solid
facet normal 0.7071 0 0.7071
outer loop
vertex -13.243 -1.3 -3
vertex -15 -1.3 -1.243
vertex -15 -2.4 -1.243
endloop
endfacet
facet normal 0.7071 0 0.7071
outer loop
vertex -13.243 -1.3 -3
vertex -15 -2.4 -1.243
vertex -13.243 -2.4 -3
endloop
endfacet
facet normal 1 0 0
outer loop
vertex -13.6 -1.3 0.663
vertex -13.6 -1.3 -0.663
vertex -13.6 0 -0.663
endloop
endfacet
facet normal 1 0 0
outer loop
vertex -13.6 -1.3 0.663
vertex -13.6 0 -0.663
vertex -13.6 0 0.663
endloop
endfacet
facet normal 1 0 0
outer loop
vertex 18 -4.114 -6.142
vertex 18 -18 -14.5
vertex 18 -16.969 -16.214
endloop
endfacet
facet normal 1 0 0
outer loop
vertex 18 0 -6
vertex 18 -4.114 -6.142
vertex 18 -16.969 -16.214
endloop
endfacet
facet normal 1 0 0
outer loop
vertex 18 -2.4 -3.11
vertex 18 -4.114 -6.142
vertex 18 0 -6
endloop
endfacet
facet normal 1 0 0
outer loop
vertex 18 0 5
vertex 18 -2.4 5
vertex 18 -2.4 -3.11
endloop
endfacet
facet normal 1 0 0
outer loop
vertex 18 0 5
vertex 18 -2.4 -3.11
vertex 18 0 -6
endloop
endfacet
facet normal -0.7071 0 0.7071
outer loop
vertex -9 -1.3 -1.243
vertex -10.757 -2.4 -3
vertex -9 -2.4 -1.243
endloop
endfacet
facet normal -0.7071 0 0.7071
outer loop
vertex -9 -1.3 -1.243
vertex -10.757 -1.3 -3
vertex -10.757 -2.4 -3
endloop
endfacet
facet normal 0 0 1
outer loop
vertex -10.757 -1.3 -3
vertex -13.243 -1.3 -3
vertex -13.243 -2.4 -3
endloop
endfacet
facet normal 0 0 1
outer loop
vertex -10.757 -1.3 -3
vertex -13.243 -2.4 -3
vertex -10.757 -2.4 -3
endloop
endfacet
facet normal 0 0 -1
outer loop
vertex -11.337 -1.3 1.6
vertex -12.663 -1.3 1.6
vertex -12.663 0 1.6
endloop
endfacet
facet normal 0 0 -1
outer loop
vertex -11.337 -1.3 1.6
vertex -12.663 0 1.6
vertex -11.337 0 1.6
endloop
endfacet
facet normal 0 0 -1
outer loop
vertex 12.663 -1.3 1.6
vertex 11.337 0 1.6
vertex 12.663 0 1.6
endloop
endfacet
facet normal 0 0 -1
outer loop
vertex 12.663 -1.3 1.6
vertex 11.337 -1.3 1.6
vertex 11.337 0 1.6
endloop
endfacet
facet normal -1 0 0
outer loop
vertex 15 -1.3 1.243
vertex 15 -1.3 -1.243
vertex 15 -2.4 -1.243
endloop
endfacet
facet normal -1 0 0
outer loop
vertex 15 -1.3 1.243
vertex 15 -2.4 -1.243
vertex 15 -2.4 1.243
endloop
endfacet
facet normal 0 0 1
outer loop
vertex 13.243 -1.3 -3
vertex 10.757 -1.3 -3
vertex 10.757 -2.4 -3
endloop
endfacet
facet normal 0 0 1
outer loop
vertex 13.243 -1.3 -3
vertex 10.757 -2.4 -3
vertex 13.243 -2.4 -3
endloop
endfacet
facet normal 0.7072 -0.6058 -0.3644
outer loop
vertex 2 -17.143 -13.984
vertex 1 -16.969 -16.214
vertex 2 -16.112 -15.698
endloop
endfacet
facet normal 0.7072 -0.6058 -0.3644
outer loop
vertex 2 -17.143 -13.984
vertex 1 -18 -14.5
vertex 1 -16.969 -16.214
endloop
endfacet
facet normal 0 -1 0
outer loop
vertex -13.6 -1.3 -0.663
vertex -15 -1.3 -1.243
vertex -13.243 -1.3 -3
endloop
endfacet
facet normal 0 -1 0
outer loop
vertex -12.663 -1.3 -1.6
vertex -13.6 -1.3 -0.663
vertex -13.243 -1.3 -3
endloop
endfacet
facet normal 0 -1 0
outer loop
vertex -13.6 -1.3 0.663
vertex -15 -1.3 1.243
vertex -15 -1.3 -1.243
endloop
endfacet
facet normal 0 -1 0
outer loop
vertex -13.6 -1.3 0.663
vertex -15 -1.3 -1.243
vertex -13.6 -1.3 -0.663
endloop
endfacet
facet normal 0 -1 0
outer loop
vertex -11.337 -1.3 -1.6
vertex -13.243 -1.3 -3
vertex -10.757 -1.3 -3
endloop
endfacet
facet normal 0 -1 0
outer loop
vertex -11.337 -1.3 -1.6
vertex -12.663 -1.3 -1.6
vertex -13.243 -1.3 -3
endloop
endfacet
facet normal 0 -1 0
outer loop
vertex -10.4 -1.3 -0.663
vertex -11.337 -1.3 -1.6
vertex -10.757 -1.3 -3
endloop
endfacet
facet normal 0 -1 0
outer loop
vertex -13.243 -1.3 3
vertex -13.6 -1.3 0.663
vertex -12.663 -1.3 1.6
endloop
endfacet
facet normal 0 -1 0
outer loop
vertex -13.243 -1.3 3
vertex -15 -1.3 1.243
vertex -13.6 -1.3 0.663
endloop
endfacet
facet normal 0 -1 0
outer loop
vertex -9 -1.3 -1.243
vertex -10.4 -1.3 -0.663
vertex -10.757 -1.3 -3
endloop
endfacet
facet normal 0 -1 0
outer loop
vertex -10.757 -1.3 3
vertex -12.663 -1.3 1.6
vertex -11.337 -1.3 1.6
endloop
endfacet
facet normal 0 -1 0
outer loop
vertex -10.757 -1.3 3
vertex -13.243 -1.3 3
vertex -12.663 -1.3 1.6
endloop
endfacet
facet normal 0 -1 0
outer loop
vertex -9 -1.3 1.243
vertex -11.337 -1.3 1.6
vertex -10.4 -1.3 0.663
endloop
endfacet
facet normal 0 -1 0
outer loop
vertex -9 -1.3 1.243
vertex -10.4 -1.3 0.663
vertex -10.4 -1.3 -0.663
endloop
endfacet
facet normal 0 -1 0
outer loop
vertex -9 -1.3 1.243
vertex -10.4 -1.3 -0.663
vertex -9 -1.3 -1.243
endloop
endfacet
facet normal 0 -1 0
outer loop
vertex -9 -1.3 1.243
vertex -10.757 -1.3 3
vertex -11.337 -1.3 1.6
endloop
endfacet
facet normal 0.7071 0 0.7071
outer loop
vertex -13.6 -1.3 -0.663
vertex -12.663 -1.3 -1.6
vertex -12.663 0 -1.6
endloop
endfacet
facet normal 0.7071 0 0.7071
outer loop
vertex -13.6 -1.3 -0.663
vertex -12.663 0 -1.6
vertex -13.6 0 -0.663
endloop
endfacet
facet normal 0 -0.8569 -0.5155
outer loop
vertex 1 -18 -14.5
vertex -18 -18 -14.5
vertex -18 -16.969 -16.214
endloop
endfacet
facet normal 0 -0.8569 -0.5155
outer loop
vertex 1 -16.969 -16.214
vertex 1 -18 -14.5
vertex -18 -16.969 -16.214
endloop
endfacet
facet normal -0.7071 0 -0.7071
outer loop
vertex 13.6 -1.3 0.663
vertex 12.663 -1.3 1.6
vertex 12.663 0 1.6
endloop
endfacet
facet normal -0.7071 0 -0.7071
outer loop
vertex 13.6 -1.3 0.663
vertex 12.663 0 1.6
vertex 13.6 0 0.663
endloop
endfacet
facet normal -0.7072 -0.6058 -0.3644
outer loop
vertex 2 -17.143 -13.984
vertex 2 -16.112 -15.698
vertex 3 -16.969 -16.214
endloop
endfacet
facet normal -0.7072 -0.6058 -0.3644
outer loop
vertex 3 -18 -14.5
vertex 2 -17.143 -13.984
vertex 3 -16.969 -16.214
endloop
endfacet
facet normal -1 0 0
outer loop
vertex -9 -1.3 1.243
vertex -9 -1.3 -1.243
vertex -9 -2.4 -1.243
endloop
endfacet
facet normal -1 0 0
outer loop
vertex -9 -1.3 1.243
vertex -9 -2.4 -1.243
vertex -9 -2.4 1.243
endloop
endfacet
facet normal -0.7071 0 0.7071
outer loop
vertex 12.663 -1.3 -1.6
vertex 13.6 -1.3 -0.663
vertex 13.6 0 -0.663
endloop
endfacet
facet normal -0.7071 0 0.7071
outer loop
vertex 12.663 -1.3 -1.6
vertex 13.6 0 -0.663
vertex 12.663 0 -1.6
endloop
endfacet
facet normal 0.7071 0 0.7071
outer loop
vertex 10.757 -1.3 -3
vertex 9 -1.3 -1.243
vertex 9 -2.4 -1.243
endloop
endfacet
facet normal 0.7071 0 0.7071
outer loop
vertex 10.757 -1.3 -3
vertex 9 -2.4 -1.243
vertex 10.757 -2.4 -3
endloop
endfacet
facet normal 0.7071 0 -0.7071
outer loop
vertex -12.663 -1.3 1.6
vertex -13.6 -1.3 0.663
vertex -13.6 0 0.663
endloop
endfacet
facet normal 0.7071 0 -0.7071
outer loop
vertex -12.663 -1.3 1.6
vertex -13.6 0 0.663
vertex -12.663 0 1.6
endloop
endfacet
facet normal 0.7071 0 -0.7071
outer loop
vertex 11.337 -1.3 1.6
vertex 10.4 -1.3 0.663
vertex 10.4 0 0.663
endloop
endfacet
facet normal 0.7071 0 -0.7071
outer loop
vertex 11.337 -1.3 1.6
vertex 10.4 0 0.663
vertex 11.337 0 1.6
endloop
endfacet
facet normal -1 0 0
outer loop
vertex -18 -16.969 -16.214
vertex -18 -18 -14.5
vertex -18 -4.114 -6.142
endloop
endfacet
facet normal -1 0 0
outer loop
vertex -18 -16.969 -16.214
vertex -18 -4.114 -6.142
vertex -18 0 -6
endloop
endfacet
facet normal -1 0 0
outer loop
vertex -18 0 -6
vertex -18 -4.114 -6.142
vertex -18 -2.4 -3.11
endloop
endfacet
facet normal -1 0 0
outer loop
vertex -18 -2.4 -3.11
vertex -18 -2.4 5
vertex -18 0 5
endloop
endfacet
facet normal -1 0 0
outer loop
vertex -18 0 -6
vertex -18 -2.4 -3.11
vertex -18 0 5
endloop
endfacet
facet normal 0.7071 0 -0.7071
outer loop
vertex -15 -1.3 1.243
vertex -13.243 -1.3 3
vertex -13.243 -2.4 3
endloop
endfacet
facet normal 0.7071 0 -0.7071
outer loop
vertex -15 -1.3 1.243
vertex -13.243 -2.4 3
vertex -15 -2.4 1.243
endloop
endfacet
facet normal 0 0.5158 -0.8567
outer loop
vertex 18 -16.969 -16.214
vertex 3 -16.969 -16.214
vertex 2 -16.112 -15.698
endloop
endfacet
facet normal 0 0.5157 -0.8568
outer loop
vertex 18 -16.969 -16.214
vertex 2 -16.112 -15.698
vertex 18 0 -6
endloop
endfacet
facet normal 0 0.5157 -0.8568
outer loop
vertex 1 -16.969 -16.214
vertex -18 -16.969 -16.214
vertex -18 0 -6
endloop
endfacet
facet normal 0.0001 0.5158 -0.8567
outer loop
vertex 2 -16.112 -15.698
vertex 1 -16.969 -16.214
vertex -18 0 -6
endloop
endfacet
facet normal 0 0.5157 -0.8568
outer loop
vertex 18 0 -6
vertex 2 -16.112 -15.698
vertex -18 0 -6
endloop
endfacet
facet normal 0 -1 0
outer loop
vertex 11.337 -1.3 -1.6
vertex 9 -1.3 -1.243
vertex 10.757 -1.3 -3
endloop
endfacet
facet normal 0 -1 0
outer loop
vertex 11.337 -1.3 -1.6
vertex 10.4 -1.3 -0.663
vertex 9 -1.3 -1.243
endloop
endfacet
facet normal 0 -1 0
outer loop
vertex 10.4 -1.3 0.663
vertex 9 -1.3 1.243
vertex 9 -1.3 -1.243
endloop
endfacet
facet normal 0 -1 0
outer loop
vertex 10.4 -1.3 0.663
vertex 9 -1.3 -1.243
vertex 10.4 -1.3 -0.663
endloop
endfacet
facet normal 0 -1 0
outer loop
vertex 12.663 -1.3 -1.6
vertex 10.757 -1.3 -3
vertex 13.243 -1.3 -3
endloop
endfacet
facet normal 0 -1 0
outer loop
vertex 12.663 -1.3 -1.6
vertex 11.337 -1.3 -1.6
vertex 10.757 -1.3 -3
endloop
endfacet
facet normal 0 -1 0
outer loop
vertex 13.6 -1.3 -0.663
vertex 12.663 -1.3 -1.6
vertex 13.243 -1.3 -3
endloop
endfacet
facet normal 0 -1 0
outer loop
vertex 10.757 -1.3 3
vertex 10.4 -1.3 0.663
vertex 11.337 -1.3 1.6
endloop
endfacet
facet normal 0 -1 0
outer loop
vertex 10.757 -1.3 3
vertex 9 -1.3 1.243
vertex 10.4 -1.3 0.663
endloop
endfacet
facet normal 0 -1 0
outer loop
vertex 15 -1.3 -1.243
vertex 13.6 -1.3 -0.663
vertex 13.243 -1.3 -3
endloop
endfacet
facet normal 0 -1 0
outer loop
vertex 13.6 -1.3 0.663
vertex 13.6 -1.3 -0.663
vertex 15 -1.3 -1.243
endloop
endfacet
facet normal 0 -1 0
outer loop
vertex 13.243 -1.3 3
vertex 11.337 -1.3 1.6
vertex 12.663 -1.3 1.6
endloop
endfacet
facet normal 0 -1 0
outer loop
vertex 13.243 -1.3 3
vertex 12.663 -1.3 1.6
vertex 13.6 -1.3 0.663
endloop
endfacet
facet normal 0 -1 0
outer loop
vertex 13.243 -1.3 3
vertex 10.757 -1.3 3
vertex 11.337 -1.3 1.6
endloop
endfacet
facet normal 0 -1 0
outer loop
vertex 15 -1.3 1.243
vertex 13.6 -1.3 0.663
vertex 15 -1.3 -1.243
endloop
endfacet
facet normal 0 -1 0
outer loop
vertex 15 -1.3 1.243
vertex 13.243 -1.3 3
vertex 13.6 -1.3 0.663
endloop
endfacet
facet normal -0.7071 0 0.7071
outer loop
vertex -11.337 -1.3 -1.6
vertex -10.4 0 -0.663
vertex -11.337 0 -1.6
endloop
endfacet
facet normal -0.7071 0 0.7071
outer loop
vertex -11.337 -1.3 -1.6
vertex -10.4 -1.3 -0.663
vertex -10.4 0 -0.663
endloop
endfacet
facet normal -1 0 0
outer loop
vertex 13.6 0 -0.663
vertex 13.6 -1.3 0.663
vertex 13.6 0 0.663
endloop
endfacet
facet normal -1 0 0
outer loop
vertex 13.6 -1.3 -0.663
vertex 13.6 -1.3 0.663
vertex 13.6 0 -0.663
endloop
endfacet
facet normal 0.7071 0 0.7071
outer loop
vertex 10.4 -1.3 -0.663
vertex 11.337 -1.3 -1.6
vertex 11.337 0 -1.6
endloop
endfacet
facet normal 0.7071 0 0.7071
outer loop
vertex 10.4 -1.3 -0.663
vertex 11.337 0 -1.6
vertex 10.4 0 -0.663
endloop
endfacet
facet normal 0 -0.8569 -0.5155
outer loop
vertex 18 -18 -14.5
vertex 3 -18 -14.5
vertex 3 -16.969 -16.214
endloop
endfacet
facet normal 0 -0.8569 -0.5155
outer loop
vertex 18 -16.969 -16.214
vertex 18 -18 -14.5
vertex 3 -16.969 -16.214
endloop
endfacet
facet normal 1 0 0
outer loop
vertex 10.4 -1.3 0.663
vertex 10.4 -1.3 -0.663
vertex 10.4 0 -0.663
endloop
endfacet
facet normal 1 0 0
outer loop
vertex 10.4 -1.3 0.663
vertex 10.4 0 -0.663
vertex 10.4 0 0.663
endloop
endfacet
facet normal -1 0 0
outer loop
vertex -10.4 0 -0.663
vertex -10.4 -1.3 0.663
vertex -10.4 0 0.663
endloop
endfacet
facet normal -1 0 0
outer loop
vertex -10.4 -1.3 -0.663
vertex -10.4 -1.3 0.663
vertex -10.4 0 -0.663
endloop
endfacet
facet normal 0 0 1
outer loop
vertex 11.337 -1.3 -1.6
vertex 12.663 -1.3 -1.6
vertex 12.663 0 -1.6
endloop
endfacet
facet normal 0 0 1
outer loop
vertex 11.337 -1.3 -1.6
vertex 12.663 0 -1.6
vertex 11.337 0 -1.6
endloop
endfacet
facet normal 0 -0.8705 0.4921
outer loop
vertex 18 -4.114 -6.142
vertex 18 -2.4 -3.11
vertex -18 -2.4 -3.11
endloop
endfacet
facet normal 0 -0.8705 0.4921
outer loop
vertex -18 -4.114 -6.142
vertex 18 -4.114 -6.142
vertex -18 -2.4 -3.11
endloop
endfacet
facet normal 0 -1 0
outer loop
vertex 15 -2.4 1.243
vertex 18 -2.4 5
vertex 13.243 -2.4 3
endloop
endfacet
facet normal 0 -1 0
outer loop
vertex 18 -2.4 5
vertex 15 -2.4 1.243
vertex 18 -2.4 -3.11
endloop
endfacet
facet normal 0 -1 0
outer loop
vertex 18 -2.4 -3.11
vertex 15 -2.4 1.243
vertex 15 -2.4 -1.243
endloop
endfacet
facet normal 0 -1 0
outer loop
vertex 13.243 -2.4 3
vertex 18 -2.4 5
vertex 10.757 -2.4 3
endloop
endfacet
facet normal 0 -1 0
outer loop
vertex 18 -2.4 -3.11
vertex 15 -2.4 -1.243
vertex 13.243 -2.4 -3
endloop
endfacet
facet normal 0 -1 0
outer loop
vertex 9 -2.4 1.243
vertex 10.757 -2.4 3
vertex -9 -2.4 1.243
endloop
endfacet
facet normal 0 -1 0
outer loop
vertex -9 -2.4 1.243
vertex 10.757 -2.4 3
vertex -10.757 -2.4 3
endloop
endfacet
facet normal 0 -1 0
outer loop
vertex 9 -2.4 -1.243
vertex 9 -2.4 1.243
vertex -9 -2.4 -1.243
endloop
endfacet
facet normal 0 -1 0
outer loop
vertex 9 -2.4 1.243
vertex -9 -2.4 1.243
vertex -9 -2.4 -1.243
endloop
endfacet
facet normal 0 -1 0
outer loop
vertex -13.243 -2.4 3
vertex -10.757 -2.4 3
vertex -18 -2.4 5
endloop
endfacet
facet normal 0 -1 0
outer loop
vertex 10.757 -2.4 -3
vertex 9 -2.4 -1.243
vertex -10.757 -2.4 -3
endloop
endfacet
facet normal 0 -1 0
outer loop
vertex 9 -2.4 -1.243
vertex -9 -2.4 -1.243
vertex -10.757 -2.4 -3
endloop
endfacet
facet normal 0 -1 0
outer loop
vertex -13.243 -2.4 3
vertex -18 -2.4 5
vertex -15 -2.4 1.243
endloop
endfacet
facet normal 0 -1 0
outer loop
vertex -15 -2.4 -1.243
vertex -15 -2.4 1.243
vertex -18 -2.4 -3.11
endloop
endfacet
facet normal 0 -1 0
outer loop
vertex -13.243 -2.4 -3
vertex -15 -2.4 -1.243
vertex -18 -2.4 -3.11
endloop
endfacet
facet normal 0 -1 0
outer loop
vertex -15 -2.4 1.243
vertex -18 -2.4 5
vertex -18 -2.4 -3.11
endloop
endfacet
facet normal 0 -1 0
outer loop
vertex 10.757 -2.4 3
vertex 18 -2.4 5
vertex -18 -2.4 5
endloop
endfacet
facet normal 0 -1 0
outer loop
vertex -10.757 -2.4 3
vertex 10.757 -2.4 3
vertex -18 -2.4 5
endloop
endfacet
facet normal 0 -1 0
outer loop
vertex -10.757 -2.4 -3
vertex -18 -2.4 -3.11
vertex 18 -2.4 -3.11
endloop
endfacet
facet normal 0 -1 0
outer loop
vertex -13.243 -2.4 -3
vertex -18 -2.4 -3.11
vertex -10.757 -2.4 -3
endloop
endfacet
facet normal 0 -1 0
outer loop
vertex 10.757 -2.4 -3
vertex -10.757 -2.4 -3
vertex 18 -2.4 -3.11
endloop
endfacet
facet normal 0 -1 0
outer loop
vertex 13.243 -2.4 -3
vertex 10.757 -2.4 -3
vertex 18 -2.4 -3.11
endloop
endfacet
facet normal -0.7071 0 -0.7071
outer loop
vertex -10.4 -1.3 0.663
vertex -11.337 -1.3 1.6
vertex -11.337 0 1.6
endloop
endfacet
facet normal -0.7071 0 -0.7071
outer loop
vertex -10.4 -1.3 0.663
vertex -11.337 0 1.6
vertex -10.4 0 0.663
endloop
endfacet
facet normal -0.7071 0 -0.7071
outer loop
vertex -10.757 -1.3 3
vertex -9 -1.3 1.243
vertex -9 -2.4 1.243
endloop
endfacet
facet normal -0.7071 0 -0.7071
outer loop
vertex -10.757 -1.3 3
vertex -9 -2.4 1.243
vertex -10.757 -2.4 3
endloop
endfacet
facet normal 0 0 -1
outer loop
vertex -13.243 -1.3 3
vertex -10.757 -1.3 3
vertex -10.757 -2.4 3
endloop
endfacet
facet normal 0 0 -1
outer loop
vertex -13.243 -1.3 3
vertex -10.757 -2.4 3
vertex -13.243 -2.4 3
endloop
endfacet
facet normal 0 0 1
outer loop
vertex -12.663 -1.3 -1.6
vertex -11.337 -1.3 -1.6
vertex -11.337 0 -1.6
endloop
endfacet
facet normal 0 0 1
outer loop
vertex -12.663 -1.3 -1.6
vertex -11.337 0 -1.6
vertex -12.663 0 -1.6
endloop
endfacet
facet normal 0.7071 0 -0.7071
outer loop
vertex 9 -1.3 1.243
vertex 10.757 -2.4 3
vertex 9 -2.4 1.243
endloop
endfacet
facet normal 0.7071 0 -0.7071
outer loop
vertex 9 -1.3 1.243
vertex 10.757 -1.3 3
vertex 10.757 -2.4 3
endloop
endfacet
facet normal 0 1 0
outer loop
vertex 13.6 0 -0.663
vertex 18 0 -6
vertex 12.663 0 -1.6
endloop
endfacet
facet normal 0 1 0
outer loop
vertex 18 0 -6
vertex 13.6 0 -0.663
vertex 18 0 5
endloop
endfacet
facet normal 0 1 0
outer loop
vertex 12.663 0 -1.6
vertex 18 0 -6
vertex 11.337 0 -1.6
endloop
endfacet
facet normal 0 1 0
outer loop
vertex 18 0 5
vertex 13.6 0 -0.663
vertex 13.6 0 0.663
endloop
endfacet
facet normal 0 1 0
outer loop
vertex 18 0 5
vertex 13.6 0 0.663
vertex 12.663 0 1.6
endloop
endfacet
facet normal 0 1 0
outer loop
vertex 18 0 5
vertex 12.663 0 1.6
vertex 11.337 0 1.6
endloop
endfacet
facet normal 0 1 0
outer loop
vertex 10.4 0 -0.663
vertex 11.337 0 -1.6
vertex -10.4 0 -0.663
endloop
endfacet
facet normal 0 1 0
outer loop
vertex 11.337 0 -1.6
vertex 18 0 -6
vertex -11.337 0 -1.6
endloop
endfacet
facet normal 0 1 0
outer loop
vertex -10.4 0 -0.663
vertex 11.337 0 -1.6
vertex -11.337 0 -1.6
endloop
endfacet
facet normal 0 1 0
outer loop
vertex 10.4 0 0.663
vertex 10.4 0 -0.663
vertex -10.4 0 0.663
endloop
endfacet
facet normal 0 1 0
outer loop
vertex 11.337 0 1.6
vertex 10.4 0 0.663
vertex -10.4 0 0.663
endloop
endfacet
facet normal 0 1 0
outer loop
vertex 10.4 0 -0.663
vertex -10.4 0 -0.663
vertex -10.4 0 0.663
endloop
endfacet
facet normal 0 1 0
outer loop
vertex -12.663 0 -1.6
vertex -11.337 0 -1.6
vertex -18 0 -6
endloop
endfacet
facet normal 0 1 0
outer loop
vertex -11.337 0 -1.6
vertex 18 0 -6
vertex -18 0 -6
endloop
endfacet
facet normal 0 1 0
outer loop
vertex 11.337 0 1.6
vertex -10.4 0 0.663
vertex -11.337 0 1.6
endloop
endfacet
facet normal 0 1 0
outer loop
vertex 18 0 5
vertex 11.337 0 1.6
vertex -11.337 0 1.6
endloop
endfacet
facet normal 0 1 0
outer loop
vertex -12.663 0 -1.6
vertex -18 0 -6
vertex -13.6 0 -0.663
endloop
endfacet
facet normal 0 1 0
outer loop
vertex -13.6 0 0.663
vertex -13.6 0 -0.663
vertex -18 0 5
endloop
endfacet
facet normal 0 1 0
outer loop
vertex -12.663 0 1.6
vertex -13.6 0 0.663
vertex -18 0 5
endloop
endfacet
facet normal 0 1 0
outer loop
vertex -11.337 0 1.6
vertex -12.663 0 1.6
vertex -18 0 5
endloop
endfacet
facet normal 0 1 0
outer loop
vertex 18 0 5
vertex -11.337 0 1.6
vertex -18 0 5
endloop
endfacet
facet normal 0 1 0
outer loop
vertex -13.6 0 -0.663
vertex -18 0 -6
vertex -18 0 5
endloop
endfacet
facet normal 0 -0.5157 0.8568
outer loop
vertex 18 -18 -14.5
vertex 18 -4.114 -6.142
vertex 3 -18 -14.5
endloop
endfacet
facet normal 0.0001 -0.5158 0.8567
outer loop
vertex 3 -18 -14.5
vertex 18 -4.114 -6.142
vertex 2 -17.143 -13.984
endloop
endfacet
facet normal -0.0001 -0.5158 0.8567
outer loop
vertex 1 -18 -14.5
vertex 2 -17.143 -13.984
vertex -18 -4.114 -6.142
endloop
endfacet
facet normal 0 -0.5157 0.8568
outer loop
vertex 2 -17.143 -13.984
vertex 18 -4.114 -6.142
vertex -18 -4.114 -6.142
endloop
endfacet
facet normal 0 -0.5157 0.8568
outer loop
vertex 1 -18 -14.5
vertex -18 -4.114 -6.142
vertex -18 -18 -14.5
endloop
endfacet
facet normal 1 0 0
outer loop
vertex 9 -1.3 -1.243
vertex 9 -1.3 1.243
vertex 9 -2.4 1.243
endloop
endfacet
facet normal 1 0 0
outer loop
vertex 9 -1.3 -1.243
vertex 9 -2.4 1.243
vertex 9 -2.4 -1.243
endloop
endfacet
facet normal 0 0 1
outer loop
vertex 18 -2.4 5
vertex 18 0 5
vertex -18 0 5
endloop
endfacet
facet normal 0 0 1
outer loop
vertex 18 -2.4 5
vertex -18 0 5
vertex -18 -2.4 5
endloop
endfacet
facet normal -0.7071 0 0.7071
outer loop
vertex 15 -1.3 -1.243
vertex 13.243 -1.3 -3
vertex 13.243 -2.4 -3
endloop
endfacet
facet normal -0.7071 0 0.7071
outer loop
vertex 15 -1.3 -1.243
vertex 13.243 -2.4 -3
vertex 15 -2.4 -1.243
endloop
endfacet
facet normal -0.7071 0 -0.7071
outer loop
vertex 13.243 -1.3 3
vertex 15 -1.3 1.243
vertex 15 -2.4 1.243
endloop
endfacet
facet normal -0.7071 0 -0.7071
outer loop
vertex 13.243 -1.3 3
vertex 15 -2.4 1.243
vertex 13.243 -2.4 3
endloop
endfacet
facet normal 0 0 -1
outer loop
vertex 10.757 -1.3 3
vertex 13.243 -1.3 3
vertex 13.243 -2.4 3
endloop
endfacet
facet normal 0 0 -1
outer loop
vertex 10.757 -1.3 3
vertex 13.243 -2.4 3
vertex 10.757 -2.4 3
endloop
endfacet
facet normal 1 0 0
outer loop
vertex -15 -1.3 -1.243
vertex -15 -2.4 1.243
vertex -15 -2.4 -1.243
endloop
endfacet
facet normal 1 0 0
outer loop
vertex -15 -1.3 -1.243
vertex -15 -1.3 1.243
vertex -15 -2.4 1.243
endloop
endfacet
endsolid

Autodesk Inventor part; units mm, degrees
ref_plane "YZ Plane" through (0, 0, 0) normal (1, 0, 0) x (0, 1, 0)
ref_plane "XZ Plane" through (0, 0, 0) normal (0, 1, 0) x (-1, 0, 0)
ref_plane "XY Plane" through (0, 0, 0) normal (0, 0, 1) x (1, 0, 0)
sketch "Skizze1" plane through (0, 0, 0) normal (1, 0, 0) x (0, 1, 0)
  line L0 (0, -6) -> (0, 5)
  line L1 (0, 5) -> (-2.4, 5)
  line L2 (-2.4, 5) -> (-2.4, -5.1102)
  line L3 (-2.4, -5.1102) -> (-18, -14.5)
  line L4 (-18, -14.5) -> (-16.9686, -16.2135)
  line L5 (-16.9686, -16.2135) -> (0, -6)
  point P0 (0, 0)
  point P1 (0, -0.5)
  dimension "d0" = 5
  dimension "d1" = 2.4
  dimension "d3" = 14
  dimension "d4" = 18
  dimension "d12" = 2
  dimension "d15" = 6
extrude "Extrusion1" add sketch "Skizze1" along normal mid plane 36
sketch "Skizze2" plane through (-18, -2.4, -5.1102) normal (0, -1, 0) x (1, 0, 0)
  line L0 (18, 14.3529) -> (18, -15.346) construction
  line L1 (31.6, 4.4475) -> (30.6627, 3.5102)
  line L2 (30.6627, 3.5102) -> (29.3373, 3.5102)
  line L3 (29.3373, 3.5102) -> (28.4, 4.4475)
  line L4 (28.4, 4.4475) -> (28.4, 5.773)
  line L5 (28.4, 5.773) -> (29.3373, 6.7102)
  line L6 (29.3373, 6.7102) -> (30.6627, 6.7102)
  line L7 (30.6627, 6.7102) -> (31.6, 5.773)
  line L8 (31.6, 5.773) -> (31.6, 4.4475)
  line L9 (7.6, 4.4475) -> (6.6627, 3.5102)
  line L10 (6.6627, 3.5102) -> (5.3373, 3.5102)
  line L11 (5.3373, 3.5102) -> (4.4, 4.4475)
  line L12 (4.4, 4.4475) -> (4.4, 5.773)
  line L13 (4.4, 5.773) -> (5.3373, 6.7102)
  line L14 (5.3373, 6.7102) -> (6.6627, 6.7102)
  line L15 (6.6627, 6.7102) -> (7.6, 5.773)
  line L16 (7.6, 5.773) -> (7.6, 4.4475)
  line L17 (-7.2, 5.1102) -> (43.2, 5.1102) construction
  point P0 (18, 5.1102)
  point P1 (30, 5.1102)
  point P2 (6, 5.1102)
  dimension "d8" = 3.2
  dimension "d9" = 24
extrude "Extrusion2" cut sketch "Skizze2" against normal through all
chamfer "Fase1" distance 2 angle 45 1 edges at (0, -2.4, -5.1102)
sketch "Skizze3" plane through (-18, -2.4, 5) normal (0, -1, 0) x (1, 0, 0)
  line L0 (36, -8.1102) -> (0, -8.1102) projected
  line L1 (36, 0) -> (36, -8.1102) projected
  line L2 (0, 0) -> (36, 0) projected
  line L3 (0, -8.1102) -> (0, 0) projected
  line L4 (29.3373, -3.4) -> (30.6627, -3.4) projected
  line L5 (30.6627, -3.4) -> (31.6, -4.3373) projected
  line L6 (31.6, -4.3373) -> (31.6, -5.6627) projected
  line L7 (31.6, -5.6627) -> (30.6627, -6.6) projected
  line L8 (30.6627, -6.6) -> (29.3373, -6.6) projected
  line L9 (29.3373, -6.6) -> (28.4, -5.6627) projected
  line L10 (28.4, -5.6627) -> (28.4, -4.3373) projected
  line L11 (28.4, -4.3373) -> (29.3373, -3.4) projected
  line L12 (5.3373, -3.4) -> (6.6627, -3.4) projected
  line L13 (6.6627, -3.4) -> (7.6, -4.3373) projected
  line L14 (7.6, -4.3373) -> (7.6, -5.6627) projected
  line L15 (7.6, -5.6627) -> (6.6627, -6.6) projected
  line L16 (6.6627, -6.6) -> (5.3373, -6.6) projected
  line L17 (5.3373, -6.6) -> (4.4, -5.6627) projected
  line L18 (4.4, -5.6627) -> (4.4, -4.3373) projected
  line L19 (4.4, -4.3373) -> (5.3373, -3.4) projected
  line L20 (31.2426, -2) -> (28.7574, -2)
  line L21 (28.7574, -2) -> (27, -3.7574)
  line L22 (27, -3.7574) -> (27, -6.2426)
  line L23 (27, -6.2426) -> (28.7574, -8)
  line L24 (28.7574, -8) -> (31.2426, -8)
  line L25 (31.2426, -8) -> (33, -6.2426)
  line L26 (33, -6.2426) -> (33, -3.7574)
  line L27 (33, -3.7574) -> (31.2426, -2)
  point P0 (18, -5)
  point P1 (28.2105, -7.4531)
  point P2 (31.7895, -7.4531)
  dimension "d19" = 6
extrude "Extrusion3" cut sketch "Skizze3" along normal mid plane 2.2 contours L27 L26 L25 L24 L23 L22 L21 L20
mirror "Spiegeln1" about plane through (0, 0, 0) normal (1, 0, 0) of "Extrusion3"
sketch "Skizze4" plane through (-18, -18, -14.5) normal (0, -0.5156973, 0.8567708) x (1, 0, 0)
  line L0 (0, 16.2079) -> (36, 16.2079) projected
  line L1 (0, 0) -> (0, 16.2079) projected
  line L2 (0, 0) -> (36, 0) projected
  line L3 (36, 16.2079) -> (36, 0) projected
  line L4 (18, 32.4901) -> (18, -6.446) construction
  line L5 (19, 0) -> (20, 1)
  line L6 (20, 1) -> (21, 0)
  line L7 (20, 1) -> (20, 0) construction
  point P0 (18, 22.8995)
  dimension "d22" = 1
  dimension "d23" = 1
extrude "Extrusion4" cut sketch "Skizze4" against normal through all contours L5 L6 L2
mirror "Spiegeln2" [suppressed]
properties part number "Dribblerdaempfer Flex" material "Gummi, Silikon"
